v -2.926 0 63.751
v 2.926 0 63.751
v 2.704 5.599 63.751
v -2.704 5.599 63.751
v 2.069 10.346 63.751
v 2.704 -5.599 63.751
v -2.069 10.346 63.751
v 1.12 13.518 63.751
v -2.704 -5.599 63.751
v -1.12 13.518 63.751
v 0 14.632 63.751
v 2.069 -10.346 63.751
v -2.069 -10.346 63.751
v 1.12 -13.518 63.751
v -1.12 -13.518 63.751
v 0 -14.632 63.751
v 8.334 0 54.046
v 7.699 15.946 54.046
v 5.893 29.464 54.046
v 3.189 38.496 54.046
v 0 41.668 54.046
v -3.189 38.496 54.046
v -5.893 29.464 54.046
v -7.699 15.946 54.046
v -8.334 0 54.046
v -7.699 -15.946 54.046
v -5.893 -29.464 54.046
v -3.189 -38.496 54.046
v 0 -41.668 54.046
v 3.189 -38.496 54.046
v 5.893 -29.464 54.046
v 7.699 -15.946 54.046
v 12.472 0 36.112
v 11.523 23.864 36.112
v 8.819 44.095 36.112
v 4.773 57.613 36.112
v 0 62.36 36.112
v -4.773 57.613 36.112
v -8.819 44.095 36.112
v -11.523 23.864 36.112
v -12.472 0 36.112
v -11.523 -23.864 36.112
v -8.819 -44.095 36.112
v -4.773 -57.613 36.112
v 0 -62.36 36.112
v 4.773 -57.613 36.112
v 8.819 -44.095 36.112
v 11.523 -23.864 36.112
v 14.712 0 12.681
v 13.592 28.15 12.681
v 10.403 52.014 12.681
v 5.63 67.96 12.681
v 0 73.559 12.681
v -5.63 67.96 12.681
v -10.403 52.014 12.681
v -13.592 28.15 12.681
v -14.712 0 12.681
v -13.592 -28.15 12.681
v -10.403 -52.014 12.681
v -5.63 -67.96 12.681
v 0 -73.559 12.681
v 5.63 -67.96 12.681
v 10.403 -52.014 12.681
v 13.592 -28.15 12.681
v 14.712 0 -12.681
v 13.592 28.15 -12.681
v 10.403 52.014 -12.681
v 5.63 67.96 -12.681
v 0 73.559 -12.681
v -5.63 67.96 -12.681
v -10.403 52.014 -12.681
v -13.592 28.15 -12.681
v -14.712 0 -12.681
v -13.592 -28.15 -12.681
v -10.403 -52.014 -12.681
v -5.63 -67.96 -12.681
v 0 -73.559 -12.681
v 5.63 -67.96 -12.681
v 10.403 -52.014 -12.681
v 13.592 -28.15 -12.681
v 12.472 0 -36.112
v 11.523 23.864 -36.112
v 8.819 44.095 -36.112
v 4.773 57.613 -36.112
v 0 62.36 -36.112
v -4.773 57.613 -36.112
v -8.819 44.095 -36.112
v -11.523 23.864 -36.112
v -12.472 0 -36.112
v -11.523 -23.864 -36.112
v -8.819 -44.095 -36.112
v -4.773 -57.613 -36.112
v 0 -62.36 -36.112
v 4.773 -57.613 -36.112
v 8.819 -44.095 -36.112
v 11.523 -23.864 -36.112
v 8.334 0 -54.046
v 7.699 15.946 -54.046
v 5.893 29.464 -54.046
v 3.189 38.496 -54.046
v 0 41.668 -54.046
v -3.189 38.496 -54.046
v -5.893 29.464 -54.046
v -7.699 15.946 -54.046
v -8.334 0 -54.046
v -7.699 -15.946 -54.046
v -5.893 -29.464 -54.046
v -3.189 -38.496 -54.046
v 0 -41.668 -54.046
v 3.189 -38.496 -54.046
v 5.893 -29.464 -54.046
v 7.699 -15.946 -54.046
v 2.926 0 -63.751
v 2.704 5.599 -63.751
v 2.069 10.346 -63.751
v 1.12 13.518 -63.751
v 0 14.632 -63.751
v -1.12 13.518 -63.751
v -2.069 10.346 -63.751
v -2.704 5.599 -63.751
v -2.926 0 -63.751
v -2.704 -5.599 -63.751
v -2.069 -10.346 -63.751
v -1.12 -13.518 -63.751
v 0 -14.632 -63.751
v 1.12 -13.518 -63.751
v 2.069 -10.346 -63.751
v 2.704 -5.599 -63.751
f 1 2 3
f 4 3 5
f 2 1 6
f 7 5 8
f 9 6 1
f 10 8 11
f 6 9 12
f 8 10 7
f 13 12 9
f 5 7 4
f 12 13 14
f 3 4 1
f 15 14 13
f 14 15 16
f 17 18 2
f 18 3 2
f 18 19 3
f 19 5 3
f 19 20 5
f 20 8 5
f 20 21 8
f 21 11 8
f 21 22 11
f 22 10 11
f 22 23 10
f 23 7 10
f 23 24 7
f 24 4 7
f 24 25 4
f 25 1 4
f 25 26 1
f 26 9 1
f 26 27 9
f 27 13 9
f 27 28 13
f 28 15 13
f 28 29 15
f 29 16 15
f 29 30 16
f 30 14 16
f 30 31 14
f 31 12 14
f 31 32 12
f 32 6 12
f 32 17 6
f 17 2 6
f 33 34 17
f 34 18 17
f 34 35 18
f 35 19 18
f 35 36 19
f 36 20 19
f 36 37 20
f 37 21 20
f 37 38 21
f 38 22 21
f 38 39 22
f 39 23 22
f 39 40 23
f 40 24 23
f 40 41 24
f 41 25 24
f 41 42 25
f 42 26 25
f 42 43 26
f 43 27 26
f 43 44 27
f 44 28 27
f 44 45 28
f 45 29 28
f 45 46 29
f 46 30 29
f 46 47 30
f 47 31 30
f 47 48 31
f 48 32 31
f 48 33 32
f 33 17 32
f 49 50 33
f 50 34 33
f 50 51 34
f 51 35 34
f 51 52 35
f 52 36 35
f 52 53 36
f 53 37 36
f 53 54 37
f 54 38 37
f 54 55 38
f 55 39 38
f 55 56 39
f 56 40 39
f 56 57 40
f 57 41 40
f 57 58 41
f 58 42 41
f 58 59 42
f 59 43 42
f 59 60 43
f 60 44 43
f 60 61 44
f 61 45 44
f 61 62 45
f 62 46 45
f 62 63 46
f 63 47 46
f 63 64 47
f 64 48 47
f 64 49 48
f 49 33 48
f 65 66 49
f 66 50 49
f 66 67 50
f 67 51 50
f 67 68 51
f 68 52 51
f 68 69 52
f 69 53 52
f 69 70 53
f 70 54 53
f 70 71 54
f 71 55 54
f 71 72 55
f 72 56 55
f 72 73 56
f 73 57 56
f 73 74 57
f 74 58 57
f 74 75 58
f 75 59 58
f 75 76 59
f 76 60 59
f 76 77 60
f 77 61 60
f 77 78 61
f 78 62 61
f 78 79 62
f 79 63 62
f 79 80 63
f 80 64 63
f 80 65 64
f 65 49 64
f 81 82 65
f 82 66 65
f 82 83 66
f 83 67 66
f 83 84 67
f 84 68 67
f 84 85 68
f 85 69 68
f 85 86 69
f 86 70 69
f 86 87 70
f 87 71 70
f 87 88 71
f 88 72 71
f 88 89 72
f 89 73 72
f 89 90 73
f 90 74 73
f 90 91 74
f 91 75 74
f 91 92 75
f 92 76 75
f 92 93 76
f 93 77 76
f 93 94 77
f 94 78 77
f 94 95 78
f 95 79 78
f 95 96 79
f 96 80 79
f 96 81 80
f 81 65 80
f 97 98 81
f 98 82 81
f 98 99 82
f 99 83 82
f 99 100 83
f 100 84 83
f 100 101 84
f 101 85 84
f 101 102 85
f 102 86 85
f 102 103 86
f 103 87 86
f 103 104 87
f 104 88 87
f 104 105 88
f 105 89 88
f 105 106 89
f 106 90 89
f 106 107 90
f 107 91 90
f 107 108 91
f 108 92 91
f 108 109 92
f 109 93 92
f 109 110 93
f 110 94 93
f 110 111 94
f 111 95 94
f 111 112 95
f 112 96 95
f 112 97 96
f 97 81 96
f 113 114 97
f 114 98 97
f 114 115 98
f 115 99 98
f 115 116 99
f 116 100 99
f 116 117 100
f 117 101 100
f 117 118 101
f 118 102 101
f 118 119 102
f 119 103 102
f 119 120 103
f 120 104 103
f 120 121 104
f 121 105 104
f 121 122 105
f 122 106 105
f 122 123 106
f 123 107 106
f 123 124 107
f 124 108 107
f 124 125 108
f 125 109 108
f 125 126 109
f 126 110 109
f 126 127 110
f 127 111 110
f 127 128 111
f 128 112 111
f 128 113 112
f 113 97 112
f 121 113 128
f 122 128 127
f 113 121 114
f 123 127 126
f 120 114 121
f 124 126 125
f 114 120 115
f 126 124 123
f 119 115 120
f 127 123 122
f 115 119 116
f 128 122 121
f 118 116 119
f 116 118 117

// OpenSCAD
// Generated by SolidPython 1.0.1 on 2020-07-29 00:46:45


scale(v = [3, 15, 13]) {
	sphere(r = 5);
}
/***********************************************
*********      SolidPython code:      **********
************************************************
 
# import packages: SolidPython
from solid import *
from solid.utils import *
from itertools import chain, combinations, permutations


class Resize:

    def __init__(self, scad_file):
        self.scad_file = scad_file
        #self.scad_file = import_scad(scad_file)
        # cone/cylinder param:
        self.r1 = 0
        self.r2 = 0
        self.h = 0
        # rectangular prism param:
        self.w = 0
        self.l = 0
        # ellipse param:
        self.r = 0

    # import OpenScad code (file name corresponds to shape)


    # classify shape + parameters
    def assign(self, param1, param2, param3):
        if self.scad_file == 'cone.scad':
            self.r1 = param1
            self.r2 = param2
            self.h = param3
        elif self.scad_file == 'cylinder.scad':
            self.r1 = param1
            self.r2 = param2
            self.h = param3
        elif self.scad_file == 'rectangularPrism.scad':
            self.h = param1
            self.l = param2
            self.w = param3
        else:
            self.r = param1
            self.h = param2

    # resize parameters
    def iterate(self):
        x = range(3, 20, 2)
        i = 1
        if self.scad_file == 'cone.scad':
            tempList = list(permutations(x, 2))
            for temp in tempList:
                param1 = temp[0]
                param2 = temp[1]
                filepath = 'produced_scad_files/' + 'cone' + str(param1) + '_' + str(param2) + '_' + '.scad'
                scad_render_to_file(cylinder(h=param1, r1=param2, r2=0), filepath)

        elif self.scad_file == 'cylinder.scad':
            tempList = list(permutations(x, 3))
            for temp in tempList:
                param1 = temp[0]
                param2 = temp[1]
                filepath = 'produced_scad_files/' + 'cylinder' + str(param1) + '_' + str(param2) + '_' + '.scad'
                scad_render_to_file(cylinder(h=param1, r1=param2, r2=param2), filepath)

        elif self.scad_file == 'rectangularPrism.scad':
            tempList = list(permutations(x, 3))
            for temp in tempList:
                param1 = temp[0]
                param2 = temp[1]
                param3 = temp[2]
                filepath = 'produced_scad_files/' + 'rectangularPrism' + str(param1) + '_' + str(param2) + '_' + str(
                    param3) + '.scad'
                scad_render_to_file(cube(size=(param1, param2, param3)), filepath)

        elif self.scad_file == 'ellipse.scad':
            tempList = list(permutations(x, 4))
            for temp in tempList:
                param1 = temp[0]
                param2 = temp[1]
                param3 = temp[2]
                param4 = temp[3]
                filepath = 'produced_scad_files/' + 'ellipse' + str(param1) + '_' + str(param2) + '_' + str(param3) + '_' + str(param4) + '.scad'
                scad_render_to_file(scale([param1, param2, param3])(sphere(r=param4)), filepath)

    def render_to_scadfile(self):
        scad_render_to_file(scad, 'example.scad') 
 
************************************************/
